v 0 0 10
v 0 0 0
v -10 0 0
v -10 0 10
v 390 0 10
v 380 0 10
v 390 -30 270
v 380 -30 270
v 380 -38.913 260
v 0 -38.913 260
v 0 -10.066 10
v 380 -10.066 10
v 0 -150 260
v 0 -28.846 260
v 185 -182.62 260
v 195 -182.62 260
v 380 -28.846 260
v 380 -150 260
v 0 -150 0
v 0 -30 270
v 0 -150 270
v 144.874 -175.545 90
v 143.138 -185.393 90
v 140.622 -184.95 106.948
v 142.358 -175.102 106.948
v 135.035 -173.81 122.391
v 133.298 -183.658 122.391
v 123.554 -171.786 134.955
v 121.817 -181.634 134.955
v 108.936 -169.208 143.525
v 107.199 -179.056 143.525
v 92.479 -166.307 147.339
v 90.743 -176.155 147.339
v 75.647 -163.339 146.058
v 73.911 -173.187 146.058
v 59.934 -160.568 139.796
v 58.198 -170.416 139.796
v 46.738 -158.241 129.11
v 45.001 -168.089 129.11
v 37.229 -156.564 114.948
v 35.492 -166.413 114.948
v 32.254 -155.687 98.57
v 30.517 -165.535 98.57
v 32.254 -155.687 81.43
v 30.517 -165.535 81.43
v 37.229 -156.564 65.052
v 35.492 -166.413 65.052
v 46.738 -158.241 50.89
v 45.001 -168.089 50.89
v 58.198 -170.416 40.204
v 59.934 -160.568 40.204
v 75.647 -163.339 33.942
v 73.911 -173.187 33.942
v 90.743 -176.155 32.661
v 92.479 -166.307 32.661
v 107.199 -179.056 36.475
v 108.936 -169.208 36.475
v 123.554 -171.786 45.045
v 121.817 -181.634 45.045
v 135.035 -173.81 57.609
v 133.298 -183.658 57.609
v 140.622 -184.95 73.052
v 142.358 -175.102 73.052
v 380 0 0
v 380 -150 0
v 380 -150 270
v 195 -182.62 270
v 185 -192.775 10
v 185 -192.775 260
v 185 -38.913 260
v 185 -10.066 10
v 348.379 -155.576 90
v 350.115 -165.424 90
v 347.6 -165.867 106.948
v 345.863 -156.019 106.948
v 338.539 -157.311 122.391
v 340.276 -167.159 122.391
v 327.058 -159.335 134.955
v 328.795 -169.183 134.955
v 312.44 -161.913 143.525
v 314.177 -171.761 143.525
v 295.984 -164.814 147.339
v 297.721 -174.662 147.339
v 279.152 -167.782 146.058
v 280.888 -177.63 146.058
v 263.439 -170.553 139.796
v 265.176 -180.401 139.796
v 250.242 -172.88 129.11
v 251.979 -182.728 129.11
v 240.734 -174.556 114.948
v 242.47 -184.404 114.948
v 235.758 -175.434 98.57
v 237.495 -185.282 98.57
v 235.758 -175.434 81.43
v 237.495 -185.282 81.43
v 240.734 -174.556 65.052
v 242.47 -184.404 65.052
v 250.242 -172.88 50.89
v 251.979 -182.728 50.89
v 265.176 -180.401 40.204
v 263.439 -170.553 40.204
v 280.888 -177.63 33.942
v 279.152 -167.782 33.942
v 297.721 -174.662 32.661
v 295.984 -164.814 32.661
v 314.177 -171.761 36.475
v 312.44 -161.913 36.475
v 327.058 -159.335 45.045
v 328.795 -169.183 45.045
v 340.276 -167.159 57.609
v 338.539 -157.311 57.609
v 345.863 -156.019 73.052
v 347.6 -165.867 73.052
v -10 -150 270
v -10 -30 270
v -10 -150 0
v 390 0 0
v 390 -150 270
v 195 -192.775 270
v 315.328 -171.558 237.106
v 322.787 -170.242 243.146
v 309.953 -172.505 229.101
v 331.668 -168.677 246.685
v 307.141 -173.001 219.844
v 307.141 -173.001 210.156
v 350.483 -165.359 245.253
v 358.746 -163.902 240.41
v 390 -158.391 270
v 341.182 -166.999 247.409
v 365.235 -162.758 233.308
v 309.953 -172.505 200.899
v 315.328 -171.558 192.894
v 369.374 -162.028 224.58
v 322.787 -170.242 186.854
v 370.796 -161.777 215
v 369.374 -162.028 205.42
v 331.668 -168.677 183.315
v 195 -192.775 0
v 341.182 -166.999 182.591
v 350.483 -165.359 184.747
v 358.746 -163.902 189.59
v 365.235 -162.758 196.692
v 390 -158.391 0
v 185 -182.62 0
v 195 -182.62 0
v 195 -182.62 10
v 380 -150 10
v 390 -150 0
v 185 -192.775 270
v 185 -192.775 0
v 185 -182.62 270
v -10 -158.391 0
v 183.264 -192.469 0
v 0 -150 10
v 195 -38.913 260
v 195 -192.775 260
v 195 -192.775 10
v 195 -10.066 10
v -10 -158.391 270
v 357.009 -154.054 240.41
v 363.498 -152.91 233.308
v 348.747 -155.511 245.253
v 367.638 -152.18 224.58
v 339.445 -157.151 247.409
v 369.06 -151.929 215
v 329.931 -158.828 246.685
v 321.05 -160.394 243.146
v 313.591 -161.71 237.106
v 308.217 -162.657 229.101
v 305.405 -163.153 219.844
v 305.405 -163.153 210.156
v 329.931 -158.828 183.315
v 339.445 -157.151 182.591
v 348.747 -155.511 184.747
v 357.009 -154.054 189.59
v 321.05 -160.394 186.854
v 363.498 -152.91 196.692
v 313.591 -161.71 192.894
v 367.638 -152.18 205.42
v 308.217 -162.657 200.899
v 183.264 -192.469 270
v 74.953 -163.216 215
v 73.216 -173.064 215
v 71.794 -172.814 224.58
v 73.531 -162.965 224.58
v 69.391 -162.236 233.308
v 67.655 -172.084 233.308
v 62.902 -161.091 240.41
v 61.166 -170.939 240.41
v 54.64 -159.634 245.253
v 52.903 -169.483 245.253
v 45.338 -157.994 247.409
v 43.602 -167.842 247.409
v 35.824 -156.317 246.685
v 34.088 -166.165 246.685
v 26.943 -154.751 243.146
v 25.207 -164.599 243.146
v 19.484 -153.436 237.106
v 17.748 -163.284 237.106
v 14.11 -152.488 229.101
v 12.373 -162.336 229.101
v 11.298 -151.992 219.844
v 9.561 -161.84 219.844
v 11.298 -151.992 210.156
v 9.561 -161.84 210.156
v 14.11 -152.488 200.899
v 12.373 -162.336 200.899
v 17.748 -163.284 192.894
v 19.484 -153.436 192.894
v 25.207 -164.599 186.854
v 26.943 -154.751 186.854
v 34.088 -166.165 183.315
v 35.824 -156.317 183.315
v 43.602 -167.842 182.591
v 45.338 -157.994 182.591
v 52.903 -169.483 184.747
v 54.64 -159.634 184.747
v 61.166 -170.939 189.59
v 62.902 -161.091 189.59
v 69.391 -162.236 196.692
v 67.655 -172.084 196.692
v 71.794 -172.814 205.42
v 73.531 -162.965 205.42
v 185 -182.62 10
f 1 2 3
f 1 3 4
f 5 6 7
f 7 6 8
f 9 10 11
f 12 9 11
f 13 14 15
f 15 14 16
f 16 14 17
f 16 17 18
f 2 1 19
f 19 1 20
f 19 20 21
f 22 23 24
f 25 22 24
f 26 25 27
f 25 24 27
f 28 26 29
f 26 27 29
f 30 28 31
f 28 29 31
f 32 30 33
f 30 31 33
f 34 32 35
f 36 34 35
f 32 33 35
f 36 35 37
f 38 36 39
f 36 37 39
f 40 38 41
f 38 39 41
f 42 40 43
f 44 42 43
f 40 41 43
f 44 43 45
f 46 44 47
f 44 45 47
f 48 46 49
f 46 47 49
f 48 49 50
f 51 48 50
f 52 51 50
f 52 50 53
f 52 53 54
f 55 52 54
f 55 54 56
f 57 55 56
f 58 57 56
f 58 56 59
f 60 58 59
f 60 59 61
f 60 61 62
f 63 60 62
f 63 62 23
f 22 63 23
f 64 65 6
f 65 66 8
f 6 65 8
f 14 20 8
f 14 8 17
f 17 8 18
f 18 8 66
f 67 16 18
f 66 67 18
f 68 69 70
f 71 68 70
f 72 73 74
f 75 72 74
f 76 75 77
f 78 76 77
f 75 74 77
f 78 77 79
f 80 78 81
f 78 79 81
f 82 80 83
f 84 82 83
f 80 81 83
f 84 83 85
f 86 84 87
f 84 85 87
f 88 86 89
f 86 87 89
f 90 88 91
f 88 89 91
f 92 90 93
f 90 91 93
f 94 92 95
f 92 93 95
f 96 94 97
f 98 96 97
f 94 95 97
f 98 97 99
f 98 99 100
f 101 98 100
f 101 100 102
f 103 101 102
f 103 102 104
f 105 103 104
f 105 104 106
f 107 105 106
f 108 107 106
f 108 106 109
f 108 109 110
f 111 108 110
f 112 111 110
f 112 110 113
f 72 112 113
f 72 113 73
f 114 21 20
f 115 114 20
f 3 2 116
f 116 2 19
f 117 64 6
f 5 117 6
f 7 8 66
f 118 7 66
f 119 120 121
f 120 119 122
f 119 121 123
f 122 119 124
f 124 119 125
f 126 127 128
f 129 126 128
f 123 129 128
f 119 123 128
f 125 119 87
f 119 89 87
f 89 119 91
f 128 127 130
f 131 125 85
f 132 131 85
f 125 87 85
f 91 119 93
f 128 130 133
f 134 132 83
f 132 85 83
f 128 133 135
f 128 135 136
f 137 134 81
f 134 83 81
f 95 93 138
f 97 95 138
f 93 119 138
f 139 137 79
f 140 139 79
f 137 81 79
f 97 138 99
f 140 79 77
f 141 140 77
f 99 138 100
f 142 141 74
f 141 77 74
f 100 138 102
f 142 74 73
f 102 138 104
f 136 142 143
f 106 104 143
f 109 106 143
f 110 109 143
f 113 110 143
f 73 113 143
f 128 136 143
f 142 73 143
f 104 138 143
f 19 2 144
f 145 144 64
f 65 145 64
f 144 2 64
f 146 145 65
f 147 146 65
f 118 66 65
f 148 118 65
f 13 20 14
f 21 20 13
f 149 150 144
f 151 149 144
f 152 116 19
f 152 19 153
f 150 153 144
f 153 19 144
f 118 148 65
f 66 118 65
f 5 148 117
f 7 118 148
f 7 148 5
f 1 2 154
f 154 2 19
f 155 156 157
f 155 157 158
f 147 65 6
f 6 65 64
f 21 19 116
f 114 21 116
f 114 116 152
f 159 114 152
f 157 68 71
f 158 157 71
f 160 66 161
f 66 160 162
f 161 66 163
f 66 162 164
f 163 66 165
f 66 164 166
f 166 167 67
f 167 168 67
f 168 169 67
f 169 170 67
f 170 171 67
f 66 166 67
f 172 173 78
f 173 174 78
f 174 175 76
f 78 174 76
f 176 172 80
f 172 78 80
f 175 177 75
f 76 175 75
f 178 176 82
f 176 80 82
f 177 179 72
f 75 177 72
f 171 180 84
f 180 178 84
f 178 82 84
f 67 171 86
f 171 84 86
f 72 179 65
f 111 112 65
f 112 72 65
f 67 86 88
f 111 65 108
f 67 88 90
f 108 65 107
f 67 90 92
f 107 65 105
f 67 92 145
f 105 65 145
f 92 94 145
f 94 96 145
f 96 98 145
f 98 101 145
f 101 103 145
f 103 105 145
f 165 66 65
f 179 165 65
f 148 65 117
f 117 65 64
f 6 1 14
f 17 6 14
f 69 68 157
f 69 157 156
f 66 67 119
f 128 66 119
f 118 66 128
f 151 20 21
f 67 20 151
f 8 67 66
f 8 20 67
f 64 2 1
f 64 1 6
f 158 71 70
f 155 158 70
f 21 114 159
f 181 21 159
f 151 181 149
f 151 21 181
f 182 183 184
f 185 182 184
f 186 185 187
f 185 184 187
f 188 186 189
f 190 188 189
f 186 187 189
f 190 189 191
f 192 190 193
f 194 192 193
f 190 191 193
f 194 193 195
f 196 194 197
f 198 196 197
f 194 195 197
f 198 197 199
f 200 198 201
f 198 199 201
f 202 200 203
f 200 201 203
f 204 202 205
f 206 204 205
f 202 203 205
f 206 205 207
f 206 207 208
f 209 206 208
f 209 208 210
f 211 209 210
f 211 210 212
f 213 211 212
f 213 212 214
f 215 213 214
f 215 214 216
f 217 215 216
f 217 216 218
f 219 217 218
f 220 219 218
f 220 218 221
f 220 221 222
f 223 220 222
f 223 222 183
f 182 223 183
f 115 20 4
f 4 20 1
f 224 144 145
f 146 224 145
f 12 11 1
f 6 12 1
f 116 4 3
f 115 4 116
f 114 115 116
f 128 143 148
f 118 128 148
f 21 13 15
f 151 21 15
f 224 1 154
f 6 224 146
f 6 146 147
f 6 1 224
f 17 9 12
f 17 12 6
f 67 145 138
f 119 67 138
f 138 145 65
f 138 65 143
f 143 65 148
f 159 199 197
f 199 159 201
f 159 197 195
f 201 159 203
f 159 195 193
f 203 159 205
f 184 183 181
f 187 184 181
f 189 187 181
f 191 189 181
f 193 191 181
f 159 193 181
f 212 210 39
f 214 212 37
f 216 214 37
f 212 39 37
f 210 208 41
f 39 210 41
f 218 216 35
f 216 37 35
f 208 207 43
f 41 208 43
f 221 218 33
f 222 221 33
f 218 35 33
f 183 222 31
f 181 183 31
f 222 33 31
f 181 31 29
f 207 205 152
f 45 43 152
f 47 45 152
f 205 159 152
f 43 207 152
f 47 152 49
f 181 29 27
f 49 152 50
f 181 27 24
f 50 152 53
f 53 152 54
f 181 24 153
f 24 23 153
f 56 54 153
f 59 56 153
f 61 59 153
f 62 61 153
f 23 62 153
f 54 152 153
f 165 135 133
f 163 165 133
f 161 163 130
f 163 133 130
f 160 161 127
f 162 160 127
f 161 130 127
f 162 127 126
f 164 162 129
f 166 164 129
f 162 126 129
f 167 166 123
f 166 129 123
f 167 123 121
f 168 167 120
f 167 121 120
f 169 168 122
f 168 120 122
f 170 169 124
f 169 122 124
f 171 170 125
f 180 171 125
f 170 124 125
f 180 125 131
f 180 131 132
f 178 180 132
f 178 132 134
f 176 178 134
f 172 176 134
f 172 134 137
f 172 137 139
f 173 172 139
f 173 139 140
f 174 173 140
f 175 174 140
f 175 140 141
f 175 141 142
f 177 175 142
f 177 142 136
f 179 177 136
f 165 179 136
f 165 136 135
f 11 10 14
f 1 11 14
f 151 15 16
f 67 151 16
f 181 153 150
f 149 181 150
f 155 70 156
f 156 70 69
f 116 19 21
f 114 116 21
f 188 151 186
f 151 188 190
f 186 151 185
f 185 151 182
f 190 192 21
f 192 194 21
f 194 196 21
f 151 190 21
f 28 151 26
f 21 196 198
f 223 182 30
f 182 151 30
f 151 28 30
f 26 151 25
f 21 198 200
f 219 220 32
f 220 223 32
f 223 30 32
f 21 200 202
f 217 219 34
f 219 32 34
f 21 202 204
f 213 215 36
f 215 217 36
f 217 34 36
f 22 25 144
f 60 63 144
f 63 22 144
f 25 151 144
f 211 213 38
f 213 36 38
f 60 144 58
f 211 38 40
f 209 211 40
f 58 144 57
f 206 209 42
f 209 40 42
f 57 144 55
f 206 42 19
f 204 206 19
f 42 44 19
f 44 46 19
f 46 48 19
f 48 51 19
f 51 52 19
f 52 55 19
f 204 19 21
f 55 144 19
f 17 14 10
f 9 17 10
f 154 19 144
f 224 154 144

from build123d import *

# Parameters (mm, degrees)
F0_W      = 10
F0_H      = 120
F0_W_2    = 380
F0_H_2    = 10
F1_DEPTH  = 10
F2_DEPTH  = 270
F3_DEPTH  = 270
F6_W      = 150
F6_H      = 10
F7_DEPTH  = 10
F8_W      = 150
F8_H      = 10
F9_DEPTH  = 10
F11_DEPTH = 380
F12_DEPTH = 10
F13_R     = 32.5
F13_R_2   = 57.5
F14_DEPTH = 25
F15_R     = 57.5
F15_R_2   = 32.5
F16_DEPTH = 25
F17_W     = 10.1542661189
F17_H     = 250
F18_DEPTH = 10
F20_DEPTH = 380


# Not quite as in the source:
# - a feature names something its author has since deleted; it is built from what else it names


with BuildPart() as f1:
    # F0 (on Top) → F1 (new body)
    with BuildSketch(Plane.XY):
        Polygon((380, -10), (0, -10), (0, -150), (185, -182.6204914311), (185, -62.6204914311), (195, -62.6204914311), (195, -182.6204914311), (380, -150), align=None)
        with Locations((190, -122.6204914311)):
            Rectangle(F0_W, F0_H)
        with Locations((190, -5)):
            Rectangle(F0_W_2, F0_H_2)
    extrude(amount=F1_DEPTH)


with BuildPart() as f2:
    # F0 (on Top) → F2 (new body)
    with BuildSketch(Plane.XY):
        Polygon((185, -182.6204914311), (0, -150), (-10, -150), (-10, -158.3909963118), (183.2635182233, -192.4685689612), (185, -192.7747575499), align=None)
    extrude(amount=F2_DEPTH)

    # F13 (on face) → F14 (cut)
    with BuildSketch(Plane(origin=(-27.3879925261, -155.3250240891, 0), x_dir=(0.984807753, -0.1736481777, 0), z_dir=(-0.1736481777, -0.984807753, 0))):
        with Locations((69.6562303383, 215)):
            Circle(F13_R)
        with Locations((115.6562303383, 90)):
            Circle(F13_R_2)
    extrude(amount=-F14_DEPTH, mode=Mode.SUBTRACT)


with BuildPart() as f3:
    # F0 (on Top) → F3 (new body)
    with BuildSketch(Plane.XY):
        Polygon((390, -150), (380, -150), (195, -182.6204914311), (195, -192.7747575499), (390, -158.3909963118), align=None)
    extrude(amount=F3_DEPTH)

    # F15 (on face) → F16 (cut)
    with BuildSketch(Plane(origin=(38.8463945768, -220.3088513209, 0), x_dir=(0.984807753, 0.1736481777, 0), z_dir=(0.1736481777, -0.984807753, 0))):
        with Locations((258.5707158064, 90)):
            Circle(F15_R)
        with Locations((304.5707158064, 215)):
            Circle(F15_R_2)
    extrude(amount=-F16_DEPTH, mode=Mode.SUBTRACT)


with BuildPart() as f7:
    # F6 (on face) → F7 (new body)
    with BuildSketch(Plane(origin=(0, 0, 0), x_dir=(0, -1, 0), z_dir=(-1, 0, 0))):
        with Locations((75, 5)):
            Rectangle(F6_W, F6_H)
        Polygon((30, 270), (0, 10), (150, 10), (150, 270), align=None)
    extrude(amount=F7_DEPTH)


with BuildPart() as f9:
    # F8 (on face) → F9 (new body)
    with BuildSketch(Plane.YZ.offset(380)):
        with Locations((-75, 5)):
            Rectangle(F8_W, F8_H)
        Polygon((-150, 270), (-150, 10), (0, 10), (-30, 270), align=None)
    extrude(amount=F9_DEPTH)


with BuildPart() as f11:
    # F10 (on face) → F11 (new body)
    with BuildSketch(Plane.YZ):
        Polygon((0, 10), (-28.8461538462, 260), (-38.912501791, 260), (-10.0663479448, 10), align=None)
    extrude(amount=F11_DEPTH)


with BuildPart() as f12:
    # F5 (on offset) → F12 (new body)
    with BuildSketch(Plane.XY.offset(260)):
        Polygon((195, -182.6204914311), (380, -150), (380, -30), (0, -30), (0, -150), (185, -182.6204914311), align=None)
    extrude(amount=F12_DEPTH)

    # F19 (on face) → F20 (join)
    with BuildSketch(Plane(origin=(380, 0, 0), x_dir=(0, -1, 0), z_dir=(-1, 0, 0))):
        Polygon((30, 260), (30, 270), (28.8461538462, 260), align=None)
    extrude(amount=F20_DEPTH)


with BuildPart() as f18:
    # F17 (on face) → F18 (new body)
    with BuildSketch(Plane.YZ.offset(185)):
        with Locations((-187.6976244905, 135)):
            Rectangle(F17_W, F17_H)
        Polygon((-10.0663479448, 10), (-38.912501791, 260), (-182.6204914311, 260), (-182.6204914311, 10), (-150, 10), align=None)
    extrude(amount=F18_DEPTH)


solid = Compound([f1.part, f2.part, f3.part, f7.part, f9.part, f11.part, f12.part, f18.part])
